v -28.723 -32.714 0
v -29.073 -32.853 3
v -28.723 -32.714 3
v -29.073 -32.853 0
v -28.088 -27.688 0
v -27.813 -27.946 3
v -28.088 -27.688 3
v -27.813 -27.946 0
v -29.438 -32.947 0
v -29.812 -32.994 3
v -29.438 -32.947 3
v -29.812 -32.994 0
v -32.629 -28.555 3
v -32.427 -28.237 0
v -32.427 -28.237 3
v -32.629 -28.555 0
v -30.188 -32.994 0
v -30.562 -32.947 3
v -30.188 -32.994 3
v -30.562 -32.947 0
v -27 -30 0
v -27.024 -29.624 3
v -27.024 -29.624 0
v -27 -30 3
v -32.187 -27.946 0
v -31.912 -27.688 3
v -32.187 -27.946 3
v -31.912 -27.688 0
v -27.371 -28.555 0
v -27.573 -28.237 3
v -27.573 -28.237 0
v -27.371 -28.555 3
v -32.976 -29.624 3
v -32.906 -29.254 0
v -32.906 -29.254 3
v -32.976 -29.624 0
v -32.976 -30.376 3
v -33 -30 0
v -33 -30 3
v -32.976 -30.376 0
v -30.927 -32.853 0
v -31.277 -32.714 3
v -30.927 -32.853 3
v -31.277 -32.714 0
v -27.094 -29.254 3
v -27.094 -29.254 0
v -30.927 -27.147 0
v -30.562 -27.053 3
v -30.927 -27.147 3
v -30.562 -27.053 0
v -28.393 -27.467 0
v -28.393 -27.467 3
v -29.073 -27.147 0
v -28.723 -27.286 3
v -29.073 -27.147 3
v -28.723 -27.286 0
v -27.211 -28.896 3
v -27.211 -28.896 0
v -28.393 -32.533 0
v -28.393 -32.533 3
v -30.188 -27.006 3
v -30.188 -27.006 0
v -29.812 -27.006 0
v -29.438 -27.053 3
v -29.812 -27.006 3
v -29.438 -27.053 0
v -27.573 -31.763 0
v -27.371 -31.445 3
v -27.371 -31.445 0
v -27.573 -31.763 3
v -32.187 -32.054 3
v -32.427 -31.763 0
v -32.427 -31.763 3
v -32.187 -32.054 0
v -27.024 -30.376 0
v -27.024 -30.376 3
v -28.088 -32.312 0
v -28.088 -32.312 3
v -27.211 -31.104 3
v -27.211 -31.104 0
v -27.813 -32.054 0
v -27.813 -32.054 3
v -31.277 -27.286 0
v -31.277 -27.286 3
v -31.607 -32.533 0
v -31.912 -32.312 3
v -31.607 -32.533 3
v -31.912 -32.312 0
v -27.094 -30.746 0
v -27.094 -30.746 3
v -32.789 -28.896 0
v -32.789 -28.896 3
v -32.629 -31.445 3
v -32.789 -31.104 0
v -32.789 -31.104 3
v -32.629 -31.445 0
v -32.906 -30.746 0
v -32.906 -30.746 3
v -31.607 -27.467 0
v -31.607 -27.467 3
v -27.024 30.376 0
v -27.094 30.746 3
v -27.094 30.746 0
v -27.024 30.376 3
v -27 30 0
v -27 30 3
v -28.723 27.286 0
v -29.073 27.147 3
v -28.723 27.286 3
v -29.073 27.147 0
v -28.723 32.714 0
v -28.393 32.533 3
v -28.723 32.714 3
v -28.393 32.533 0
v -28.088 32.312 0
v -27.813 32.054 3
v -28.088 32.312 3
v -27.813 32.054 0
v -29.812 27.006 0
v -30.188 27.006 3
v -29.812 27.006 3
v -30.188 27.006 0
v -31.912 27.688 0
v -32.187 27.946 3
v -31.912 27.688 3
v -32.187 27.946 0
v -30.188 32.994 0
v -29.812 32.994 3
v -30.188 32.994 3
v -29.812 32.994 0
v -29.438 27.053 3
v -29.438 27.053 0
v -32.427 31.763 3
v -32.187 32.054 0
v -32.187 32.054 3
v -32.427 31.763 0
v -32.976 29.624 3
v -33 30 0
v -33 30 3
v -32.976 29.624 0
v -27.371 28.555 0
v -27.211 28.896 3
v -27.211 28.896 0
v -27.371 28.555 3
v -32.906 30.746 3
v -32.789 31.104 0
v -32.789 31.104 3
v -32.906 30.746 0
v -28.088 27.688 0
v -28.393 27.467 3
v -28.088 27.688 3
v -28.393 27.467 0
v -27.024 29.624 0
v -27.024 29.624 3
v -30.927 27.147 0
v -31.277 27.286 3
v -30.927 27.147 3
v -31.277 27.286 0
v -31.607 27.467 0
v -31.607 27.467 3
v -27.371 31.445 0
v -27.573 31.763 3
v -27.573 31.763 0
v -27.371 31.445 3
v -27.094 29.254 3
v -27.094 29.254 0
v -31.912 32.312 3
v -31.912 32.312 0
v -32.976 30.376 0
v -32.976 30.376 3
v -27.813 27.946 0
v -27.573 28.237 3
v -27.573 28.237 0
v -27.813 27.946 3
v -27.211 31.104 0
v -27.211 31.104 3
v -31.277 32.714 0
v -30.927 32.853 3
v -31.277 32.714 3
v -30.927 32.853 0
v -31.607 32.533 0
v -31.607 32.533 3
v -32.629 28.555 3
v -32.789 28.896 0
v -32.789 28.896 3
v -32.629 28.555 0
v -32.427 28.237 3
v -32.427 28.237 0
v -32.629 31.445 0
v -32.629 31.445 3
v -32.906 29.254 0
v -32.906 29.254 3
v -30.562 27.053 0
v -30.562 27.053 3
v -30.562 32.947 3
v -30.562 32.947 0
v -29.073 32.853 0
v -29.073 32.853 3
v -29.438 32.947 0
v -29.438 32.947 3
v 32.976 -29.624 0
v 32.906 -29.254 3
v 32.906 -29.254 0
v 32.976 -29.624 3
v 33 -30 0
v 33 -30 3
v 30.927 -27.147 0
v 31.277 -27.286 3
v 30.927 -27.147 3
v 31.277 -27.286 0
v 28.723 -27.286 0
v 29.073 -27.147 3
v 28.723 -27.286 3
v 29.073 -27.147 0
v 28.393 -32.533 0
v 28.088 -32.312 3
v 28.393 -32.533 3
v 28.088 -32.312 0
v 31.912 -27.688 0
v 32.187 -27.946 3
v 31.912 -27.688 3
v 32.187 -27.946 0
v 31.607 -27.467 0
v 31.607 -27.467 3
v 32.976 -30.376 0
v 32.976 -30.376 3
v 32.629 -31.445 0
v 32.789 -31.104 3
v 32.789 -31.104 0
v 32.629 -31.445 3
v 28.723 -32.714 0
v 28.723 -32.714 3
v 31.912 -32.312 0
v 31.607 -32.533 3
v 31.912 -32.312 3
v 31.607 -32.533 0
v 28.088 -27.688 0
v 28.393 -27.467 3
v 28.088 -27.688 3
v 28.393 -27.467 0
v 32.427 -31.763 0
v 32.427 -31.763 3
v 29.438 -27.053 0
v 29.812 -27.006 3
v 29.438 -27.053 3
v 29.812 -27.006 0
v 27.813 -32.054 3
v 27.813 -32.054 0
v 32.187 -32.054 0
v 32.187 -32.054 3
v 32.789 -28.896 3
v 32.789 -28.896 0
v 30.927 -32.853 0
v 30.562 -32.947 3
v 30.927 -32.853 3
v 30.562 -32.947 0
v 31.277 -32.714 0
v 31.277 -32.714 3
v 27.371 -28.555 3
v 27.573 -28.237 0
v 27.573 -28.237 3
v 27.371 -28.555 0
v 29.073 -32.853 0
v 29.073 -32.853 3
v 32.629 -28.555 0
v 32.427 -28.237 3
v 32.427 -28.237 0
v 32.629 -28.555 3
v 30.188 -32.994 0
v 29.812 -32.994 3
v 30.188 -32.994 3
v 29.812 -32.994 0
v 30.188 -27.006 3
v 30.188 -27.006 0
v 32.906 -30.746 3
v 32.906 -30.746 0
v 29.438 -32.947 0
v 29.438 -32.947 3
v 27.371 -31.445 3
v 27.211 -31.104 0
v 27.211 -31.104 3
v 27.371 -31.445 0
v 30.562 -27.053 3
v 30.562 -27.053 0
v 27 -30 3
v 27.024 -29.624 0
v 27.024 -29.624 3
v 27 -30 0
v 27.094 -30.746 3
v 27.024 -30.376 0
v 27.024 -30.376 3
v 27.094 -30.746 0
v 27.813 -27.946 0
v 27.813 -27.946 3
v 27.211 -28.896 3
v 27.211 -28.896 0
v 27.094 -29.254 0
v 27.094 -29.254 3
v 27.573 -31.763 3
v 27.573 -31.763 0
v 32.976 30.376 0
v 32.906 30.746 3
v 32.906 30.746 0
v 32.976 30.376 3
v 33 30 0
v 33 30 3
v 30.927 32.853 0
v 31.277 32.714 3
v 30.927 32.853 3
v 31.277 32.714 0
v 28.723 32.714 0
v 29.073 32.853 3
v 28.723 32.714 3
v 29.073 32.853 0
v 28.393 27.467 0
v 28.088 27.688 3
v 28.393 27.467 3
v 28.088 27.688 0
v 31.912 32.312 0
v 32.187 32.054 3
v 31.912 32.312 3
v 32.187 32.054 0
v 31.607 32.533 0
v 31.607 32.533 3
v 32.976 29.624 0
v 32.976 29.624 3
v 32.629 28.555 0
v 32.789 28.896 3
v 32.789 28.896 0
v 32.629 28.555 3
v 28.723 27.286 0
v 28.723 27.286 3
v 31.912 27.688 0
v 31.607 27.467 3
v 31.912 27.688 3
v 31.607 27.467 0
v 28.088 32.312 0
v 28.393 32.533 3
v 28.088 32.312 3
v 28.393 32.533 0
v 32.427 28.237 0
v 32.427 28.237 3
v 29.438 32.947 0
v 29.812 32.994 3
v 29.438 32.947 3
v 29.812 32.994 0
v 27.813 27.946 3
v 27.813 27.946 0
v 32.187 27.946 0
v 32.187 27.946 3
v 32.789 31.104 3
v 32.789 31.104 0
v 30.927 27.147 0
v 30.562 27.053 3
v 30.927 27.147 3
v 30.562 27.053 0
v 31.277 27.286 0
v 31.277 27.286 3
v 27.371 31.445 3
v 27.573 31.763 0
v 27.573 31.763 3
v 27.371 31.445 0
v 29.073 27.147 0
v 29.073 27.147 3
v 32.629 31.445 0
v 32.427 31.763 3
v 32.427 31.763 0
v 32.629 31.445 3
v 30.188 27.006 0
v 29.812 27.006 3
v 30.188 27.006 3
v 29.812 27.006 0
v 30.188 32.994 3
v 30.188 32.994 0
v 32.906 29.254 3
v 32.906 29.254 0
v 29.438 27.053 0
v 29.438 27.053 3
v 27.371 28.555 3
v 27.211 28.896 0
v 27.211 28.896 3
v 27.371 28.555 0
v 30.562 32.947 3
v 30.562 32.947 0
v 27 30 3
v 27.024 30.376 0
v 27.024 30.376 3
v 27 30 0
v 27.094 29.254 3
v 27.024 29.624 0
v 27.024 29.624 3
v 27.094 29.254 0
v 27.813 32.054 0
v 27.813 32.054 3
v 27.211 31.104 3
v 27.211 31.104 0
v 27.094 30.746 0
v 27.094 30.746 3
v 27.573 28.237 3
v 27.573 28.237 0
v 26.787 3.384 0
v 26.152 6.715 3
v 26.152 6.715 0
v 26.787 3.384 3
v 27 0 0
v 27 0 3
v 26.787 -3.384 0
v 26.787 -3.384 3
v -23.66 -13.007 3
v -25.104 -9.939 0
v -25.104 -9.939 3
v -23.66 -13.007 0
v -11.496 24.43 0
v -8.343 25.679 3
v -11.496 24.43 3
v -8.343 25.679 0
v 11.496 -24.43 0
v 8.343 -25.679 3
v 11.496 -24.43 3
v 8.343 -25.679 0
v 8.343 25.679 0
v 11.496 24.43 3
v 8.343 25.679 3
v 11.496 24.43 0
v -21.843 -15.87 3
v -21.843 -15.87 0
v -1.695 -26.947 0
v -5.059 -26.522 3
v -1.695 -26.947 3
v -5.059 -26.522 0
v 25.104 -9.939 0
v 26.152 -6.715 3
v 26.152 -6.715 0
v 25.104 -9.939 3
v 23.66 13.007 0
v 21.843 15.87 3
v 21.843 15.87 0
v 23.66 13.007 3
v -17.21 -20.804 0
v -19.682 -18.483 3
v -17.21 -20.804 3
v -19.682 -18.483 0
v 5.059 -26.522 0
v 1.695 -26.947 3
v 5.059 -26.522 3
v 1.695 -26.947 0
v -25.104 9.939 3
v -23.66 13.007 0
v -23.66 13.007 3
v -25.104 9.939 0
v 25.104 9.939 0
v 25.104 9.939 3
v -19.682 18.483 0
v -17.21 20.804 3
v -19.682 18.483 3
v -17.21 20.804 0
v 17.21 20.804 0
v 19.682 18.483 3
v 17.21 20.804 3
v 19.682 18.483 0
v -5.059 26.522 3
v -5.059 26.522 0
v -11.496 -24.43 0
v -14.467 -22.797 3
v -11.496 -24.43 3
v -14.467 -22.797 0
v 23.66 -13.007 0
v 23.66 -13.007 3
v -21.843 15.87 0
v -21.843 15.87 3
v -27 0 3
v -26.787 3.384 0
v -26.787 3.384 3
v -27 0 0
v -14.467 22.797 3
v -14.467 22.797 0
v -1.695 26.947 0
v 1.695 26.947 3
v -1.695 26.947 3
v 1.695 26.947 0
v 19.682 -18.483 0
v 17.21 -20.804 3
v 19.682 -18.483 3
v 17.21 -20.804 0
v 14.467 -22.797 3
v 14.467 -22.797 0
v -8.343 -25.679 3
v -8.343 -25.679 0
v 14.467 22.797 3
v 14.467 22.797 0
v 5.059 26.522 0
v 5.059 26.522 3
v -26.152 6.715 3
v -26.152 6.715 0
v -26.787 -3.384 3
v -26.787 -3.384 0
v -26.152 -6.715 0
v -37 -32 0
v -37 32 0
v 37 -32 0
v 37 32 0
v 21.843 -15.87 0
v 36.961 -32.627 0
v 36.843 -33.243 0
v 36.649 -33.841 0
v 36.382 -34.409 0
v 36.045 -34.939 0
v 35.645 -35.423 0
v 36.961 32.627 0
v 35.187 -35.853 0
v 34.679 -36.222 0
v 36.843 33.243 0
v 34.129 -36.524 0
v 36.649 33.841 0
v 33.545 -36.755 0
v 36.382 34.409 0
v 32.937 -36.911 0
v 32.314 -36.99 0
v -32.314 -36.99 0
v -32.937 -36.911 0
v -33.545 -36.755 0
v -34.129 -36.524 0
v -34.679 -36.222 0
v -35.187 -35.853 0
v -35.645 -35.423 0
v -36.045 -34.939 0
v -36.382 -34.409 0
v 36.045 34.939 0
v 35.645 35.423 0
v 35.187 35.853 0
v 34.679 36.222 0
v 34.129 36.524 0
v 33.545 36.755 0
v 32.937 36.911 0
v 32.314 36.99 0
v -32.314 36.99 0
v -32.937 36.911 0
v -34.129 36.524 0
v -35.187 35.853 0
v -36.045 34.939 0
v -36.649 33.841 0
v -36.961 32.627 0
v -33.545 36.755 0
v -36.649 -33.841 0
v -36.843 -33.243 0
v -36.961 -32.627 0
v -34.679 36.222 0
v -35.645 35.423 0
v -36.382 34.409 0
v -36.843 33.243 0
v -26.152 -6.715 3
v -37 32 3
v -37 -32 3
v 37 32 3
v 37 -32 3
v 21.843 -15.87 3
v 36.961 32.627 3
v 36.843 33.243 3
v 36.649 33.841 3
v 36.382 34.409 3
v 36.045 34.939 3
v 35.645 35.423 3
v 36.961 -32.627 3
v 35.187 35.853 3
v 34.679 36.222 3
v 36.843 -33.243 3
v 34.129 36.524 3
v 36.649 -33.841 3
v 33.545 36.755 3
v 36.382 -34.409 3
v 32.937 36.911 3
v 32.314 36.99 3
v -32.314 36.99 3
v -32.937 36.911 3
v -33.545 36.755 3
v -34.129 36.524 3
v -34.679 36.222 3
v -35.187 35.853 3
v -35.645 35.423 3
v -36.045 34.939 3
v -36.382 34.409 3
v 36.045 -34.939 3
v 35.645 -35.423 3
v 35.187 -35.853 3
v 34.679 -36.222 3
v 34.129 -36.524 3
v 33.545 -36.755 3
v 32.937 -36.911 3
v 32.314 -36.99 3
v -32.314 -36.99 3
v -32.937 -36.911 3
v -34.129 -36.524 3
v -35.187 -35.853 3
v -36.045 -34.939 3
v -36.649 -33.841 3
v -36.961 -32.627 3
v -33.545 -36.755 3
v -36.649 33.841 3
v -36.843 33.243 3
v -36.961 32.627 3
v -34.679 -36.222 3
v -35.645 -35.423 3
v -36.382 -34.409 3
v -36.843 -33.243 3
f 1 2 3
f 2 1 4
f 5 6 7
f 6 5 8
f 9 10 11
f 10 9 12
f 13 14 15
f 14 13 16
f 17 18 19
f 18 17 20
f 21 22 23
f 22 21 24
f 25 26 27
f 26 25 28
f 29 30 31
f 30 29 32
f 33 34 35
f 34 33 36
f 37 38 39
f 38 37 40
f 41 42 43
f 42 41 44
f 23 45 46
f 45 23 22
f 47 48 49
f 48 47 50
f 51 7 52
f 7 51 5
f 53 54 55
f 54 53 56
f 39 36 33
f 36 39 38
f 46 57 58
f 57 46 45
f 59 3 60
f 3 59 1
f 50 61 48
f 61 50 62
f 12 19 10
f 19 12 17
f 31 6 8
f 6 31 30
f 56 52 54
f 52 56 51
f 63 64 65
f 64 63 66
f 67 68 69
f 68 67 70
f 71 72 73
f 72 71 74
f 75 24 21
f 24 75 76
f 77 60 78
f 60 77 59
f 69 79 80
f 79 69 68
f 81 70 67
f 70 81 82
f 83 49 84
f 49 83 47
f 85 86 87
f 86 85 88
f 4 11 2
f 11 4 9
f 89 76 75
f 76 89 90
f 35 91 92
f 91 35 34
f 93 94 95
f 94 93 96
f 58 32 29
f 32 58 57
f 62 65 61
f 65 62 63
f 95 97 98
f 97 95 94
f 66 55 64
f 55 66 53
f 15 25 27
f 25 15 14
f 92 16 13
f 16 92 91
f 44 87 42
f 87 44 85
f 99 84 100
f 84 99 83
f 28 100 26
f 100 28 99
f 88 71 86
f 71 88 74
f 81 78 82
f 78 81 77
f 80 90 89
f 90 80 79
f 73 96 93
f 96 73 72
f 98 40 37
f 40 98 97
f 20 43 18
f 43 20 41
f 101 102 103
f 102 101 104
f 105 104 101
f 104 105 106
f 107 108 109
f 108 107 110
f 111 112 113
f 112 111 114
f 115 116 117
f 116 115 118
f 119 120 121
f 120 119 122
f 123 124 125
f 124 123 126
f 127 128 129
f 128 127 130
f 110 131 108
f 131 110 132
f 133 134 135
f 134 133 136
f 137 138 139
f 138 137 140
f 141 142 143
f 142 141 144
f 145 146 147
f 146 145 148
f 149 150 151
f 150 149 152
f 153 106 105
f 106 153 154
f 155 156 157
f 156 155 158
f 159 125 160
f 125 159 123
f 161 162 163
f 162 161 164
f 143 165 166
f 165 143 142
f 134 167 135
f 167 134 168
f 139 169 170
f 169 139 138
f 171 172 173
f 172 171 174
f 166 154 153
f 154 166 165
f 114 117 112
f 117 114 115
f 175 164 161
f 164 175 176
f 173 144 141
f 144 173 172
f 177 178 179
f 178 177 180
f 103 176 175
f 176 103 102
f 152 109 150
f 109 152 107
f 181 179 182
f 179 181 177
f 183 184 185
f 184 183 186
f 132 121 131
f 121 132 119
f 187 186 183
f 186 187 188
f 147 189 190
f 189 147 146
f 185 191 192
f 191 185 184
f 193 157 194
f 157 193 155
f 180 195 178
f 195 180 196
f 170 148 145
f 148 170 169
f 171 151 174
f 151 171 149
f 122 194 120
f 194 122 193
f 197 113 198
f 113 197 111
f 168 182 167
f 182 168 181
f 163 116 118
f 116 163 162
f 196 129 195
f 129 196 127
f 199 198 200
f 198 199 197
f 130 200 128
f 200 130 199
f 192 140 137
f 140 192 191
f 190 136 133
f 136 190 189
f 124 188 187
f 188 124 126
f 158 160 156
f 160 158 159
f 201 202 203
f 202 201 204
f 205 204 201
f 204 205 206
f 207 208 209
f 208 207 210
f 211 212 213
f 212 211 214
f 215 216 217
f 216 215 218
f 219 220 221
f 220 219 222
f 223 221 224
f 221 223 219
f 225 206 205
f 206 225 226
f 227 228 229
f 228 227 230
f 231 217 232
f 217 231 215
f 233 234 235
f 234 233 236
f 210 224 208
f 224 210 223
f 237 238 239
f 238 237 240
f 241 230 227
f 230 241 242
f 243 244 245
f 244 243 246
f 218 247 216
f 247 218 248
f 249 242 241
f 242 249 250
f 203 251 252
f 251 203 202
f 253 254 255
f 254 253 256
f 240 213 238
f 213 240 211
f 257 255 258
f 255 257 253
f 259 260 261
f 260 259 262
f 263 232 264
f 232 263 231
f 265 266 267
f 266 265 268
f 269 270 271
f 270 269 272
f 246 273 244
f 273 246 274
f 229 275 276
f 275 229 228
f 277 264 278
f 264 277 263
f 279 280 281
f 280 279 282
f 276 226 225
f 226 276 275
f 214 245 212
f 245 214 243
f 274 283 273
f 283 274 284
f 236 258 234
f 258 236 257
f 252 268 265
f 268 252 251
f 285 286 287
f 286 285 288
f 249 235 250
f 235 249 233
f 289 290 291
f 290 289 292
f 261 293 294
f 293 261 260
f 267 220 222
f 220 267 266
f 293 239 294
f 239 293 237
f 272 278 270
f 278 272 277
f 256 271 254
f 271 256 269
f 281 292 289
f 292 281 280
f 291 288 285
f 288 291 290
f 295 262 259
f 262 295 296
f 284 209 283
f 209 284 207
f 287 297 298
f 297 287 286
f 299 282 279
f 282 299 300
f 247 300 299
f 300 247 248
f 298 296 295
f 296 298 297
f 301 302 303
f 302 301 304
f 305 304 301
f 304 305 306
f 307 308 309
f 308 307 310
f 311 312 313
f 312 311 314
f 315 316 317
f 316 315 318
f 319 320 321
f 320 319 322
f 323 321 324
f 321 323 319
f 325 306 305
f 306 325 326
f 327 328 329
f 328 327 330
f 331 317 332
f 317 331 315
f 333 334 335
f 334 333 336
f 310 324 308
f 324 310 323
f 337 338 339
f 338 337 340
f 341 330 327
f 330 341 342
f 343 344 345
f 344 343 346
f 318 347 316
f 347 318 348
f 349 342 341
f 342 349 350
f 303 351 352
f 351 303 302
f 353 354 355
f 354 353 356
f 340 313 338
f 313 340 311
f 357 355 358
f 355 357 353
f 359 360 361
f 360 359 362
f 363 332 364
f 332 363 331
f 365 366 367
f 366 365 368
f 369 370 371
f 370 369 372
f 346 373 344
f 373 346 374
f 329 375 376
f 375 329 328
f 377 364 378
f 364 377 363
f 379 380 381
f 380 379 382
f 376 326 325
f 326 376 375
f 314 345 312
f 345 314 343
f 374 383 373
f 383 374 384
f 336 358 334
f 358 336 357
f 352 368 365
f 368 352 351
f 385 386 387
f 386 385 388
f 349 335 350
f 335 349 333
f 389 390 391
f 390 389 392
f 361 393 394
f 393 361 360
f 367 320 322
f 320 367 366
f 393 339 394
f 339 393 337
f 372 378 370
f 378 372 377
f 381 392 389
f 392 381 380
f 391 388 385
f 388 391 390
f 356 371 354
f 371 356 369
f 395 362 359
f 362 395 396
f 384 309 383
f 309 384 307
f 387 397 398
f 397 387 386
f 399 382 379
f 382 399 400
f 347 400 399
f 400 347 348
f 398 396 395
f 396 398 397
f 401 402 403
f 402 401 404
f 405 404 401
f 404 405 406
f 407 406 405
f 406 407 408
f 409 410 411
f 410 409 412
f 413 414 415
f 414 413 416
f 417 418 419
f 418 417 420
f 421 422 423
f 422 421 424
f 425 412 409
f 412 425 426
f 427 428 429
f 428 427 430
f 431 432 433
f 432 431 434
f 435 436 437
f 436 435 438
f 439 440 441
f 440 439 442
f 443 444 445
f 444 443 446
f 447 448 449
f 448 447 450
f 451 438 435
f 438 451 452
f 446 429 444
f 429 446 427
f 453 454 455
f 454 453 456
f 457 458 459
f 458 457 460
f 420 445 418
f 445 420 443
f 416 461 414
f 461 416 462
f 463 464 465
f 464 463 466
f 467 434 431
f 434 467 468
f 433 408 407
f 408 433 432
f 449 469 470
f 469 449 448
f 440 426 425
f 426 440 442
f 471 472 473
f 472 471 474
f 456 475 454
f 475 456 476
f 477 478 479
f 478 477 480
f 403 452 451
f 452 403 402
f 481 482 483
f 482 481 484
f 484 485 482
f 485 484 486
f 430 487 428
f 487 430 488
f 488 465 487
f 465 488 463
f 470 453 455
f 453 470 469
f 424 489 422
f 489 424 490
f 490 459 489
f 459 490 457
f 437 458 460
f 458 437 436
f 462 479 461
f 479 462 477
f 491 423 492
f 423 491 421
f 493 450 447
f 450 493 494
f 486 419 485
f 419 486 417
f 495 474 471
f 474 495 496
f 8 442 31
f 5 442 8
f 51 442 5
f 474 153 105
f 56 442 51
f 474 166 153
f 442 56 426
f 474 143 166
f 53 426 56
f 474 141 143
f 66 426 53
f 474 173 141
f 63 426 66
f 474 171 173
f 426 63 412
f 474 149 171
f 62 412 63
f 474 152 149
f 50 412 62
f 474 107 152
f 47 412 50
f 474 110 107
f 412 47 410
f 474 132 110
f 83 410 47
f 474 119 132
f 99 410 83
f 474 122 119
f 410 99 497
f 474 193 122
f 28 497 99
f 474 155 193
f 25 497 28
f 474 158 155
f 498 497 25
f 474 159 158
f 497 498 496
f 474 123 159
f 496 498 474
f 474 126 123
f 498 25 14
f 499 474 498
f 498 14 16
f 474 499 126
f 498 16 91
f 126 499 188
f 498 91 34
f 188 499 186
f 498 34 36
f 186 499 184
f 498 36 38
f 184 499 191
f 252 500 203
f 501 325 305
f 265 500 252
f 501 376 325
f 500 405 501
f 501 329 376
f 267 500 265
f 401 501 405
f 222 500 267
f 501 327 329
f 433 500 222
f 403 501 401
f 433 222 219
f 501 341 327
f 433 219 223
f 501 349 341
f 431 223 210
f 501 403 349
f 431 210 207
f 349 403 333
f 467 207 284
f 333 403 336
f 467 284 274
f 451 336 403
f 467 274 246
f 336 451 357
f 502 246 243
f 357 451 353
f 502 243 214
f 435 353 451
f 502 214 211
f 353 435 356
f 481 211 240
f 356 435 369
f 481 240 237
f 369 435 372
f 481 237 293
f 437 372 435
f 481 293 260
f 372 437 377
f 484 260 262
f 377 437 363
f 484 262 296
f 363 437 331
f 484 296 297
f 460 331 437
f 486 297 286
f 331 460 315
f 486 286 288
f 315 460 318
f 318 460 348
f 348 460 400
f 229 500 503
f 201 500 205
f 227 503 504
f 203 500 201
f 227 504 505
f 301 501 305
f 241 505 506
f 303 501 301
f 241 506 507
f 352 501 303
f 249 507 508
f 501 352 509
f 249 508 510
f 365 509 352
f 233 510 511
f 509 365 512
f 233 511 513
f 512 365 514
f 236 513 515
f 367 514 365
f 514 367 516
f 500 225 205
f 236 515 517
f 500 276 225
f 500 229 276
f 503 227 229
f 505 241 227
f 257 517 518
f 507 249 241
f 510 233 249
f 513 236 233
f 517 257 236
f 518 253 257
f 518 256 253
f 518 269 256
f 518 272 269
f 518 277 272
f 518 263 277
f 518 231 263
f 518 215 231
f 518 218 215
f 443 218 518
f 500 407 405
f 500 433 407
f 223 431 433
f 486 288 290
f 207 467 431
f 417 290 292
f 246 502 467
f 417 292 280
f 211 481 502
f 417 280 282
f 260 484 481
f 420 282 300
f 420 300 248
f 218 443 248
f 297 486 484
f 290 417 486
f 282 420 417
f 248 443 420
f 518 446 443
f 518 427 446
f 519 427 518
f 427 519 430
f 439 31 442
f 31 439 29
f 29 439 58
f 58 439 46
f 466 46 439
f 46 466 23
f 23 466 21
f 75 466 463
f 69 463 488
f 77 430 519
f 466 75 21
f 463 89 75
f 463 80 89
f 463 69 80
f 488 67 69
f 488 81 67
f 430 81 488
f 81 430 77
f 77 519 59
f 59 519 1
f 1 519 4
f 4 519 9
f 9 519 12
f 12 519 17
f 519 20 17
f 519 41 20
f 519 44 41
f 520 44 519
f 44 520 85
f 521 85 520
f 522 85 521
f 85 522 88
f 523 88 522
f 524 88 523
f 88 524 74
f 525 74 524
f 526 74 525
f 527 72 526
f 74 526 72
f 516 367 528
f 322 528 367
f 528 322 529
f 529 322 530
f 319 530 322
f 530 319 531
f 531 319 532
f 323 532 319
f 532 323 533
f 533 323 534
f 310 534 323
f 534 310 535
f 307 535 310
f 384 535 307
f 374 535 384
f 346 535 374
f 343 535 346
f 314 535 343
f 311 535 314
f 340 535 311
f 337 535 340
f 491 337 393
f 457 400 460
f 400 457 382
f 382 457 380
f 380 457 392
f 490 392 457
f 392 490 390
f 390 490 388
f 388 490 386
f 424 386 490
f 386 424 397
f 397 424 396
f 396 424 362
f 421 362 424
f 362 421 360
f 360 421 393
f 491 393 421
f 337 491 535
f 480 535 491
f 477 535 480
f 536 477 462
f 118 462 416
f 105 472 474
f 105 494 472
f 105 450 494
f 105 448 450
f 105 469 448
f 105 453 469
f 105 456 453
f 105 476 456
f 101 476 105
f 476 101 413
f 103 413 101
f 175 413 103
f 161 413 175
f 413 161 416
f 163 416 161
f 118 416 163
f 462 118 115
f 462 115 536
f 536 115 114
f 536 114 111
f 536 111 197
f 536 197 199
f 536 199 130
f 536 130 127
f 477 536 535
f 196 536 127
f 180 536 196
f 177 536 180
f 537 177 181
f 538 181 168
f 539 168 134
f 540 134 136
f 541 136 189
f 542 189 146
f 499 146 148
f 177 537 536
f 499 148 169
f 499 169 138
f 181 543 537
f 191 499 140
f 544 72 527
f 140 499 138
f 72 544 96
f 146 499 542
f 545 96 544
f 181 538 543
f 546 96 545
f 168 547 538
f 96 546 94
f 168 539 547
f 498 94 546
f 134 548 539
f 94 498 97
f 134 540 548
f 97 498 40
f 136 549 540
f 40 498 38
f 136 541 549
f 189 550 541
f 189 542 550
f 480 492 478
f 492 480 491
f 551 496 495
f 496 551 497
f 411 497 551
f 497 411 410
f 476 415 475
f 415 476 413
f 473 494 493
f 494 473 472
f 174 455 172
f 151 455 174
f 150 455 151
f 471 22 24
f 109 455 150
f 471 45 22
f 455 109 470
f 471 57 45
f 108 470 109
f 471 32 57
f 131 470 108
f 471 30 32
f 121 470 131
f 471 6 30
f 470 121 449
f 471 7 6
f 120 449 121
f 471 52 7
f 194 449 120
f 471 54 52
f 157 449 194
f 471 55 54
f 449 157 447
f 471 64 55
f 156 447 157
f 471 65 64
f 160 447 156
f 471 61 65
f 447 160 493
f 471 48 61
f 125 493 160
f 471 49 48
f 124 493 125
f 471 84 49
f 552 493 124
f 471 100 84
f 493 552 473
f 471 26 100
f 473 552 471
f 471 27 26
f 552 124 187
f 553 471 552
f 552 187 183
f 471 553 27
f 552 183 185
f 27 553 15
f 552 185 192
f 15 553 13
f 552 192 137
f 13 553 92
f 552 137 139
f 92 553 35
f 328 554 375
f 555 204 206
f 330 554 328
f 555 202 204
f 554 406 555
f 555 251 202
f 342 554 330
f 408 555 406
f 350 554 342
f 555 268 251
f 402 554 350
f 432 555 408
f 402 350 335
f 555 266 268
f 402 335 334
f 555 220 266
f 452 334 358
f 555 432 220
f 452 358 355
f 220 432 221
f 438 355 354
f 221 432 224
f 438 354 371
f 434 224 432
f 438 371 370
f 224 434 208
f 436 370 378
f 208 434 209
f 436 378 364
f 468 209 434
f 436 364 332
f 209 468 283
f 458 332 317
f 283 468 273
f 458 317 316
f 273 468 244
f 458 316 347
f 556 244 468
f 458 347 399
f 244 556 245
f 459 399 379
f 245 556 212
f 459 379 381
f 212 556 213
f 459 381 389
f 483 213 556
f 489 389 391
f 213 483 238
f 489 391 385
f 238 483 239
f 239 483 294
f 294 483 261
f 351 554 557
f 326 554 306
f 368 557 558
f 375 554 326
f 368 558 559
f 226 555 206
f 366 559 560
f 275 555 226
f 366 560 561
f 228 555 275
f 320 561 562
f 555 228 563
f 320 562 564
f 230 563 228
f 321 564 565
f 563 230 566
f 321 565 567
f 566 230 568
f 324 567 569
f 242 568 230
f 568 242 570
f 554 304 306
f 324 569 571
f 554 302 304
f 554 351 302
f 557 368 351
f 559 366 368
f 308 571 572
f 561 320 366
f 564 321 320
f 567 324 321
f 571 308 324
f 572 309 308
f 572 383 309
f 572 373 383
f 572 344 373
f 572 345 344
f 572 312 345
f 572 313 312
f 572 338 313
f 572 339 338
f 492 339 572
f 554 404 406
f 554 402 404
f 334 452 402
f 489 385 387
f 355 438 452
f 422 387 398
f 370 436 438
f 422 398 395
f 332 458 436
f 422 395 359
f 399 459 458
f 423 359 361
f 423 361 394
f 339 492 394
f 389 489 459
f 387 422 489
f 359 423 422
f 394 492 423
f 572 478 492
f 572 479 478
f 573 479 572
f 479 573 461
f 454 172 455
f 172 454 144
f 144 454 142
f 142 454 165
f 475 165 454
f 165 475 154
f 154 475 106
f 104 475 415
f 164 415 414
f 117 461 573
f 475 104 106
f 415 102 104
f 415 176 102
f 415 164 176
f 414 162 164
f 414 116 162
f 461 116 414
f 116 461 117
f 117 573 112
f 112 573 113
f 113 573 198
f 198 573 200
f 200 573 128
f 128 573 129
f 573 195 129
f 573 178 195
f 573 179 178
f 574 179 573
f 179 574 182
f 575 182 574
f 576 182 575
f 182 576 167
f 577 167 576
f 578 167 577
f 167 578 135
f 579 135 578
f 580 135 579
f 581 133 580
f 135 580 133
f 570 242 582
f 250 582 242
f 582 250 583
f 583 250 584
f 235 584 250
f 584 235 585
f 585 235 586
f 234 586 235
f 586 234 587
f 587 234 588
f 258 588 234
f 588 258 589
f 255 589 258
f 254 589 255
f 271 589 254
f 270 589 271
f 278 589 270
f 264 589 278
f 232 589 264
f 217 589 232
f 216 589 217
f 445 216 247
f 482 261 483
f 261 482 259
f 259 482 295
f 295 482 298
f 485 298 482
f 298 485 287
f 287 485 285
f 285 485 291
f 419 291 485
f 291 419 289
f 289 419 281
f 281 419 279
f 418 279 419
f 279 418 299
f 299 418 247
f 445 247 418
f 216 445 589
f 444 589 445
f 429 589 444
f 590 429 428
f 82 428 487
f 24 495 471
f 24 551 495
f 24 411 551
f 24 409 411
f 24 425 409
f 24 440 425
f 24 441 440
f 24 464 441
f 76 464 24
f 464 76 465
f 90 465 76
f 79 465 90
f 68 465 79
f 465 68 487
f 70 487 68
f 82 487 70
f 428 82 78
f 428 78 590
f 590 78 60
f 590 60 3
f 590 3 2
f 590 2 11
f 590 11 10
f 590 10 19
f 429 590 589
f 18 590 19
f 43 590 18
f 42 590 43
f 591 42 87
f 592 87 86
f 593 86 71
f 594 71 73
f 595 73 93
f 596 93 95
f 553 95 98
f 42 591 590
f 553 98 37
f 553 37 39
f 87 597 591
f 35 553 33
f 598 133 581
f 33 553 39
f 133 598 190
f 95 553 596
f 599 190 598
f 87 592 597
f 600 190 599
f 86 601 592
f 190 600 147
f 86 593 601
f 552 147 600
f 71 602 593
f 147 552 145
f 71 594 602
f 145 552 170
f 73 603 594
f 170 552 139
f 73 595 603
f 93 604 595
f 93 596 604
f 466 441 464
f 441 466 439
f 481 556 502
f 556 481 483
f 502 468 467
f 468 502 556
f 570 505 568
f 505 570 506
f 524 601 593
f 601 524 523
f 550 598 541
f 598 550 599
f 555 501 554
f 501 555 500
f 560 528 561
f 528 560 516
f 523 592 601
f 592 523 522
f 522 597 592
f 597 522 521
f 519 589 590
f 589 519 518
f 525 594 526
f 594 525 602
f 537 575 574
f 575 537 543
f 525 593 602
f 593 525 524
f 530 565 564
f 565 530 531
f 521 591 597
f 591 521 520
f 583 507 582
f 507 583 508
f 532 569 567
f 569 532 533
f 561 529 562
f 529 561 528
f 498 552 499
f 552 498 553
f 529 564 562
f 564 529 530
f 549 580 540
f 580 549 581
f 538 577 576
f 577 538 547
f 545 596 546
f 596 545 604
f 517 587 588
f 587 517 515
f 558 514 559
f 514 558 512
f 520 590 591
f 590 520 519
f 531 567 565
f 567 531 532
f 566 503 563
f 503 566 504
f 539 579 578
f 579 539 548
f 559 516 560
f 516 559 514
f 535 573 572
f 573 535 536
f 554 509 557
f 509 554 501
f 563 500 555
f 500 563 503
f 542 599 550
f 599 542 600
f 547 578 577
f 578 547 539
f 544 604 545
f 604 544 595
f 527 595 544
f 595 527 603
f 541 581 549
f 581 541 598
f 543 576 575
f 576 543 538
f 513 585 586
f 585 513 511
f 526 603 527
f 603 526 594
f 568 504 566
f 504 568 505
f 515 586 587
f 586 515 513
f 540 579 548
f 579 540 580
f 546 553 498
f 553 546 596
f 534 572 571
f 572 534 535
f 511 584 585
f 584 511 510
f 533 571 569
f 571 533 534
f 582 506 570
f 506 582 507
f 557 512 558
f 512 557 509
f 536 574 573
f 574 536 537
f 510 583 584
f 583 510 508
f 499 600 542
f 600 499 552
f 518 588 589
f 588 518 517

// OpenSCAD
$fn = 50;


difference() {
	union() {
		hull() {
			translate(v = [-32.0000000000, 32.0000000000, 0]) {
				cylinder(h = 3, r = 5);
			}
			translate(v = [32.0000000000, 32.0000000000, 0]) {
				cylinder(h = 3, r = 5);
			}
			translate(v = [-32.0000000000, -32.0000000000, 0]) {
				cylinder(h = 3, r = 5);
			}
			translate(v = [32.0000000000, -32.0000000000, 0]) {
				cylinder(h = 3, r = 5);
			}
		}
	}
	union() {
		#translate(v = [-30.0000000000, -30.0000000000, -100.0000000000]) {
			cylinder(h = 200, r = 3.0000000000);
		}
		#translate(v = [-30.0000000000, 30.0000000000, -100.0000000000]) {
			cylinder(h = 200, r = 3.0000000000);
		}
		#translate(v = [30.0000000000, -30.0000000000, -100.0000000000]) {
			cylinder(h = 200, r = 3.0000000000);
		}
		#translate(v = [30.0000000000, 30.0000000000, -100.0000000000]) {
			cylinder(h = 200, r = 3.0000000000);
		}
		#cylinder(h = 3, r = 27.0000000000);
	}
}
